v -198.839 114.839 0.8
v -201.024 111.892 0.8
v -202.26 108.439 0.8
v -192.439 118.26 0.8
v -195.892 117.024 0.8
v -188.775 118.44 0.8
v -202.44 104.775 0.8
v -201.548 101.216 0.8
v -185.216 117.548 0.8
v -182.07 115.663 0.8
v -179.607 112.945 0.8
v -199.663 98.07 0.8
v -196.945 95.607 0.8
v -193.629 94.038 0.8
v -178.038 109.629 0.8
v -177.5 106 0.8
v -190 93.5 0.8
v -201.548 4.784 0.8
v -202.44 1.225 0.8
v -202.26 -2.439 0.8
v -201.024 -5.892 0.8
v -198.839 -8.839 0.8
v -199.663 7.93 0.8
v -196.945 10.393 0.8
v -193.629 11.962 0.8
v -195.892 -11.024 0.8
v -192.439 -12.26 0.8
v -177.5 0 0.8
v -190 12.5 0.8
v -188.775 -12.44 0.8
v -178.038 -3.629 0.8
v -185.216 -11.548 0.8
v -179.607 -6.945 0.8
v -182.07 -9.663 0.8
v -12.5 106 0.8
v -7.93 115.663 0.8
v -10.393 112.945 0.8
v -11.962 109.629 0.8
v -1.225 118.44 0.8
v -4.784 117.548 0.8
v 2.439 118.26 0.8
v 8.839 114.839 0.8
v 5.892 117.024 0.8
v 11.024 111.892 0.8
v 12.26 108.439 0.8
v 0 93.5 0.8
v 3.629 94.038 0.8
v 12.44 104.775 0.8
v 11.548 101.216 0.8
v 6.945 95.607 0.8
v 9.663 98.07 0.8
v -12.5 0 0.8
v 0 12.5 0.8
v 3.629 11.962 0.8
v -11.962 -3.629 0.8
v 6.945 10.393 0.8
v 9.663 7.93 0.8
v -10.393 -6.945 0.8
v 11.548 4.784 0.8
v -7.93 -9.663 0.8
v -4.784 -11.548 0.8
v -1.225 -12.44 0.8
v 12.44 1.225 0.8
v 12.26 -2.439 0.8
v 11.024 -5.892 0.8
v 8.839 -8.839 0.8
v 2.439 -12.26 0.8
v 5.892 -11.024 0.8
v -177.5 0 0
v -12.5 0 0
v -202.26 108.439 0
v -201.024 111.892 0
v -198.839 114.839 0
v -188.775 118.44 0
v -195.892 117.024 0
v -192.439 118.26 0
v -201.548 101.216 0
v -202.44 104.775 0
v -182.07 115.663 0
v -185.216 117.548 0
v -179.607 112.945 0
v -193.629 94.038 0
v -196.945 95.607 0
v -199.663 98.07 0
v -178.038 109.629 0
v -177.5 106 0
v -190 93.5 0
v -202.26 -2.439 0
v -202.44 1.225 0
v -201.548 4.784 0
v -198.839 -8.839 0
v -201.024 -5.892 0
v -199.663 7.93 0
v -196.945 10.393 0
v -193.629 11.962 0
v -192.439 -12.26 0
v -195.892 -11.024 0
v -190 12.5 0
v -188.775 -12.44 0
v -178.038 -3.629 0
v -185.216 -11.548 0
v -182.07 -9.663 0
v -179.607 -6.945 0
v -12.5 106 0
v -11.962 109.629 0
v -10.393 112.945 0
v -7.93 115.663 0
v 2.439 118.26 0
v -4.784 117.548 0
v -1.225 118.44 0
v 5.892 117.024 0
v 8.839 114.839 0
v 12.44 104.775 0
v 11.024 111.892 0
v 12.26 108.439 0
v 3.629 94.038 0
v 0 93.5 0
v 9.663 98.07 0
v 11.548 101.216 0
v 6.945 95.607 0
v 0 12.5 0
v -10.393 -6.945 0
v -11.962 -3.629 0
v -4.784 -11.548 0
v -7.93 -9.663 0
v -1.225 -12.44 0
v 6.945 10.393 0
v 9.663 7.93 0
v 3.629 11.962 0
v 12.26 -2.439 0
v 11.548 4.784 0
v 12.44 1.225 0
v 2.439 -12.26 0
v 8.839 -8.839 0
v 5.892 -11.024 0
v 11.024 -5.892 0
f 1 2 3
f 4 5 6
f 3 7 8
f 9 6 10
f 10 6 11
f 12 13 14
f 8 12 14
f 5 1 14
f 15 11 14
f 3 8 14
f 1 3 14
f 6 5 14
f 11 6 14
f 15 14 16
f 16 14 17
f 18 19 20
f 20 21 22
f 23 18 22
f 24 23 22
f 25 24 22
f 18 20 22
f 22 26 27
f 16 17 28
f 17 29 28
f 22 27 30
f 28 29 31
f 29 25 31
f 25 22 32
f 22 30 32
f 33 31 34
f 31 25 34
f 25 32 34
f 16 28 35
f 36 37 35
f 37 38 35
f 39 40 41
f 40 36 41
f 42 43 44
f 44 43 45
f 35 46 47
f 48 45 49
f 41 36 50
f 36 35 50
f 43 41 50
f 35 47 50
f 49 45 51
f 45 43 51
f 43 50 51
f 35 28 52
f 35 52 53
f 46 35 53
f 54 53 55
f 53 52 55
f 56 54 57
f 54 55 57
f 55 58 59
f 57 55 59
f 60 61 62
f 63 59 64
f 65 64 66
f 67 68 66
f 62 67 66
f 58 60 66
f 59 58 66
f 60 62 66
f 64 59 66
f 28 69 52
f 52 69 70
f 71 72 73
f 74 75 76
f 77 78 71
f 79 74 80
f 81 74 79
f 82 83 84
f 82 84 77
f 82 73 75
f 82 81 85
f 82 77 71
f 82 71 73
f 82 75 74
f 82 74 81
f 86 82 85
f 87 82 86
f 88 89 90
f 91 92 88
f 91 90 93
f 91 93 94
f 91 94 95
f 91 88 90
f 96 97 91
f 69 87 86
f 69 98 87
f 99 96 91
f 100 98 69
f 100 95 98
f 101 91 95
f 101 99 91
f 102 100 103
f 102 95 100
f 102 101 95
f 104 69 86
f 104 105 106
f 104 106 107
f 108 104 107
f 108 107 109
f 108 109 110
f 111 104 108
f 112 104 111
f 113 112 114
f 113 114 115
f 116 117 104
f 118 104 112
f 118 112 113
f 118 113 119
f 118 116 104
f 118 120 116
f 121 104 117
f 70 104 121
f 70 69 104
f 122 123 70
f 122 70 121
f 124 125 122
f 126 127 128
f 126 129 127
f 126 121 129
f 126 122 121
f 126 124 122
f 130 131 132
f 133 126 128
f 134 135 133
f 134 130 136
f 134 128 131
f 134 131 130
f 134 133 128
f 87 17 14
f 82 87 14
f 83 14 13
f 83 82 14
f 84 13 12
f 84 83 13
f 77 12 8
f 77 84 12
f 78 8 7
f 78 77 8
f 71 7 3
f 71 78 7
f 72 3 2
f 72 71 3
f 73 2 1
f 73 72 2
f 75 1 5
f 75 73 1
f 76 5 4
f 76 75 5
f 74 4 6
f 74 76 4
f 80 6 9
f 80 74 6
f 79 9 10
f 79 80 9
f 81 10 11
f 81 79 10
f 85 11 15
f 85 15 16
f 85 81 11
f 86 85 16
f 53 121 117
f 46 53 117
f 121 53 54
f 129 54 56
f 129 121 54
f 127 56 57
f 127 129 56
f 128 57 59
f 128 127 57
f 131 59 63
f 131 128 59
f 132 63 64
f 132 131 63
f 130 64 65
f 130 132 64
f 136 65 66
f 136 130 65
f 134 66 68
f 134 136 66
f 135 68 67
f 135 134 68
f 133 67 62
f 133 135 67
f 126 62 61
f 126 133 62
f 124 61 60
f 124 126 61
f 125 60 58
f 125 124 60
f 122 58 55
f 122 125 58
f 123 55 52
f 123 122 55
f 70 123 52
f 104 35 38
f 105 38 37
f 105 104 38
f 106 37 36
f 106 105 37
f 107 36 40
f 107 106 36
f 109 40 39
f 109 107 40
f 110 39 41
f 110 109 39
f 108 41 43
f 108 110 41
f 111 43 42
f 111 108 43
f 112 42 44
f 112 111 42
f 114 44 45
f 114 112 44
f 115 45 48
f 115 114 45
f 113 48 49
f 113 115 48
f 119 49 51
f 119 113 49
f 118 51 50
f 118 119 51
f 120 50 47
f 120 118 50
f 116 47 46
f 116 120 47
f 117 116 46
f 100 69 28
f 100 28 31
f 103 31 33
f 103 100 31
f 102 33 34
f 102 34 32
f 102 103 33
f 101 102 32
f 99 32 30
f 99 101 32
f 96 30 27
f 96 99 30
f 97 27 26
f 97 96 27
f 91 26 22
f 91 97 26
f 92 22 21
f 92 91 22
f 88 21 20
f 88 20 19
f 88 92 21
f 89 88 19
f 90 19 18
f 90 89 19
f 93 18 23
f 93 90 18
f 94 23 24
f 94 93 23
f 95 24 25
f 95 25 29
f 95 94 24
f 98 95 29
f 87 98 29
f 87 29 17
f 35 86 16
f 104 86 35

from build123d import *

# Parameters (mm, degrees)
F0_W     = 190
F0_H     = 106
F1_DEPTH = 0.8
F2_R     = 12.5
F3_DEPTH = 0.8


# Not quite as in the source:
# - a feature names something its author has since deleted; it is built from what else it names


with BuildPart() as f1:
    # F0 (on Top) → F1 (new body)
    with BuildSketch(Plane.XY):
        with Locations((-95, 53)):
            Rectangle(F0_W, F0_H)
    extrude(amount=F1_DEPTH)

    # F2 (on face) → F3 (join)
    with BuildSketch(Plane(origin=(0, 0, 0), x_dir=(1, 0, 0), z_dir=(0, 0, -1))):
        Circle(F2_R)
        with Locations((-190, 0)):
            Circle(F2_R)
        with Locations((-190, -106)):
            Circle(F2_R)
        with Locations((0, -106)):
            Circle(F2_R)
    extrude(amount=-F3_DEPTH)


solid = f1.part
